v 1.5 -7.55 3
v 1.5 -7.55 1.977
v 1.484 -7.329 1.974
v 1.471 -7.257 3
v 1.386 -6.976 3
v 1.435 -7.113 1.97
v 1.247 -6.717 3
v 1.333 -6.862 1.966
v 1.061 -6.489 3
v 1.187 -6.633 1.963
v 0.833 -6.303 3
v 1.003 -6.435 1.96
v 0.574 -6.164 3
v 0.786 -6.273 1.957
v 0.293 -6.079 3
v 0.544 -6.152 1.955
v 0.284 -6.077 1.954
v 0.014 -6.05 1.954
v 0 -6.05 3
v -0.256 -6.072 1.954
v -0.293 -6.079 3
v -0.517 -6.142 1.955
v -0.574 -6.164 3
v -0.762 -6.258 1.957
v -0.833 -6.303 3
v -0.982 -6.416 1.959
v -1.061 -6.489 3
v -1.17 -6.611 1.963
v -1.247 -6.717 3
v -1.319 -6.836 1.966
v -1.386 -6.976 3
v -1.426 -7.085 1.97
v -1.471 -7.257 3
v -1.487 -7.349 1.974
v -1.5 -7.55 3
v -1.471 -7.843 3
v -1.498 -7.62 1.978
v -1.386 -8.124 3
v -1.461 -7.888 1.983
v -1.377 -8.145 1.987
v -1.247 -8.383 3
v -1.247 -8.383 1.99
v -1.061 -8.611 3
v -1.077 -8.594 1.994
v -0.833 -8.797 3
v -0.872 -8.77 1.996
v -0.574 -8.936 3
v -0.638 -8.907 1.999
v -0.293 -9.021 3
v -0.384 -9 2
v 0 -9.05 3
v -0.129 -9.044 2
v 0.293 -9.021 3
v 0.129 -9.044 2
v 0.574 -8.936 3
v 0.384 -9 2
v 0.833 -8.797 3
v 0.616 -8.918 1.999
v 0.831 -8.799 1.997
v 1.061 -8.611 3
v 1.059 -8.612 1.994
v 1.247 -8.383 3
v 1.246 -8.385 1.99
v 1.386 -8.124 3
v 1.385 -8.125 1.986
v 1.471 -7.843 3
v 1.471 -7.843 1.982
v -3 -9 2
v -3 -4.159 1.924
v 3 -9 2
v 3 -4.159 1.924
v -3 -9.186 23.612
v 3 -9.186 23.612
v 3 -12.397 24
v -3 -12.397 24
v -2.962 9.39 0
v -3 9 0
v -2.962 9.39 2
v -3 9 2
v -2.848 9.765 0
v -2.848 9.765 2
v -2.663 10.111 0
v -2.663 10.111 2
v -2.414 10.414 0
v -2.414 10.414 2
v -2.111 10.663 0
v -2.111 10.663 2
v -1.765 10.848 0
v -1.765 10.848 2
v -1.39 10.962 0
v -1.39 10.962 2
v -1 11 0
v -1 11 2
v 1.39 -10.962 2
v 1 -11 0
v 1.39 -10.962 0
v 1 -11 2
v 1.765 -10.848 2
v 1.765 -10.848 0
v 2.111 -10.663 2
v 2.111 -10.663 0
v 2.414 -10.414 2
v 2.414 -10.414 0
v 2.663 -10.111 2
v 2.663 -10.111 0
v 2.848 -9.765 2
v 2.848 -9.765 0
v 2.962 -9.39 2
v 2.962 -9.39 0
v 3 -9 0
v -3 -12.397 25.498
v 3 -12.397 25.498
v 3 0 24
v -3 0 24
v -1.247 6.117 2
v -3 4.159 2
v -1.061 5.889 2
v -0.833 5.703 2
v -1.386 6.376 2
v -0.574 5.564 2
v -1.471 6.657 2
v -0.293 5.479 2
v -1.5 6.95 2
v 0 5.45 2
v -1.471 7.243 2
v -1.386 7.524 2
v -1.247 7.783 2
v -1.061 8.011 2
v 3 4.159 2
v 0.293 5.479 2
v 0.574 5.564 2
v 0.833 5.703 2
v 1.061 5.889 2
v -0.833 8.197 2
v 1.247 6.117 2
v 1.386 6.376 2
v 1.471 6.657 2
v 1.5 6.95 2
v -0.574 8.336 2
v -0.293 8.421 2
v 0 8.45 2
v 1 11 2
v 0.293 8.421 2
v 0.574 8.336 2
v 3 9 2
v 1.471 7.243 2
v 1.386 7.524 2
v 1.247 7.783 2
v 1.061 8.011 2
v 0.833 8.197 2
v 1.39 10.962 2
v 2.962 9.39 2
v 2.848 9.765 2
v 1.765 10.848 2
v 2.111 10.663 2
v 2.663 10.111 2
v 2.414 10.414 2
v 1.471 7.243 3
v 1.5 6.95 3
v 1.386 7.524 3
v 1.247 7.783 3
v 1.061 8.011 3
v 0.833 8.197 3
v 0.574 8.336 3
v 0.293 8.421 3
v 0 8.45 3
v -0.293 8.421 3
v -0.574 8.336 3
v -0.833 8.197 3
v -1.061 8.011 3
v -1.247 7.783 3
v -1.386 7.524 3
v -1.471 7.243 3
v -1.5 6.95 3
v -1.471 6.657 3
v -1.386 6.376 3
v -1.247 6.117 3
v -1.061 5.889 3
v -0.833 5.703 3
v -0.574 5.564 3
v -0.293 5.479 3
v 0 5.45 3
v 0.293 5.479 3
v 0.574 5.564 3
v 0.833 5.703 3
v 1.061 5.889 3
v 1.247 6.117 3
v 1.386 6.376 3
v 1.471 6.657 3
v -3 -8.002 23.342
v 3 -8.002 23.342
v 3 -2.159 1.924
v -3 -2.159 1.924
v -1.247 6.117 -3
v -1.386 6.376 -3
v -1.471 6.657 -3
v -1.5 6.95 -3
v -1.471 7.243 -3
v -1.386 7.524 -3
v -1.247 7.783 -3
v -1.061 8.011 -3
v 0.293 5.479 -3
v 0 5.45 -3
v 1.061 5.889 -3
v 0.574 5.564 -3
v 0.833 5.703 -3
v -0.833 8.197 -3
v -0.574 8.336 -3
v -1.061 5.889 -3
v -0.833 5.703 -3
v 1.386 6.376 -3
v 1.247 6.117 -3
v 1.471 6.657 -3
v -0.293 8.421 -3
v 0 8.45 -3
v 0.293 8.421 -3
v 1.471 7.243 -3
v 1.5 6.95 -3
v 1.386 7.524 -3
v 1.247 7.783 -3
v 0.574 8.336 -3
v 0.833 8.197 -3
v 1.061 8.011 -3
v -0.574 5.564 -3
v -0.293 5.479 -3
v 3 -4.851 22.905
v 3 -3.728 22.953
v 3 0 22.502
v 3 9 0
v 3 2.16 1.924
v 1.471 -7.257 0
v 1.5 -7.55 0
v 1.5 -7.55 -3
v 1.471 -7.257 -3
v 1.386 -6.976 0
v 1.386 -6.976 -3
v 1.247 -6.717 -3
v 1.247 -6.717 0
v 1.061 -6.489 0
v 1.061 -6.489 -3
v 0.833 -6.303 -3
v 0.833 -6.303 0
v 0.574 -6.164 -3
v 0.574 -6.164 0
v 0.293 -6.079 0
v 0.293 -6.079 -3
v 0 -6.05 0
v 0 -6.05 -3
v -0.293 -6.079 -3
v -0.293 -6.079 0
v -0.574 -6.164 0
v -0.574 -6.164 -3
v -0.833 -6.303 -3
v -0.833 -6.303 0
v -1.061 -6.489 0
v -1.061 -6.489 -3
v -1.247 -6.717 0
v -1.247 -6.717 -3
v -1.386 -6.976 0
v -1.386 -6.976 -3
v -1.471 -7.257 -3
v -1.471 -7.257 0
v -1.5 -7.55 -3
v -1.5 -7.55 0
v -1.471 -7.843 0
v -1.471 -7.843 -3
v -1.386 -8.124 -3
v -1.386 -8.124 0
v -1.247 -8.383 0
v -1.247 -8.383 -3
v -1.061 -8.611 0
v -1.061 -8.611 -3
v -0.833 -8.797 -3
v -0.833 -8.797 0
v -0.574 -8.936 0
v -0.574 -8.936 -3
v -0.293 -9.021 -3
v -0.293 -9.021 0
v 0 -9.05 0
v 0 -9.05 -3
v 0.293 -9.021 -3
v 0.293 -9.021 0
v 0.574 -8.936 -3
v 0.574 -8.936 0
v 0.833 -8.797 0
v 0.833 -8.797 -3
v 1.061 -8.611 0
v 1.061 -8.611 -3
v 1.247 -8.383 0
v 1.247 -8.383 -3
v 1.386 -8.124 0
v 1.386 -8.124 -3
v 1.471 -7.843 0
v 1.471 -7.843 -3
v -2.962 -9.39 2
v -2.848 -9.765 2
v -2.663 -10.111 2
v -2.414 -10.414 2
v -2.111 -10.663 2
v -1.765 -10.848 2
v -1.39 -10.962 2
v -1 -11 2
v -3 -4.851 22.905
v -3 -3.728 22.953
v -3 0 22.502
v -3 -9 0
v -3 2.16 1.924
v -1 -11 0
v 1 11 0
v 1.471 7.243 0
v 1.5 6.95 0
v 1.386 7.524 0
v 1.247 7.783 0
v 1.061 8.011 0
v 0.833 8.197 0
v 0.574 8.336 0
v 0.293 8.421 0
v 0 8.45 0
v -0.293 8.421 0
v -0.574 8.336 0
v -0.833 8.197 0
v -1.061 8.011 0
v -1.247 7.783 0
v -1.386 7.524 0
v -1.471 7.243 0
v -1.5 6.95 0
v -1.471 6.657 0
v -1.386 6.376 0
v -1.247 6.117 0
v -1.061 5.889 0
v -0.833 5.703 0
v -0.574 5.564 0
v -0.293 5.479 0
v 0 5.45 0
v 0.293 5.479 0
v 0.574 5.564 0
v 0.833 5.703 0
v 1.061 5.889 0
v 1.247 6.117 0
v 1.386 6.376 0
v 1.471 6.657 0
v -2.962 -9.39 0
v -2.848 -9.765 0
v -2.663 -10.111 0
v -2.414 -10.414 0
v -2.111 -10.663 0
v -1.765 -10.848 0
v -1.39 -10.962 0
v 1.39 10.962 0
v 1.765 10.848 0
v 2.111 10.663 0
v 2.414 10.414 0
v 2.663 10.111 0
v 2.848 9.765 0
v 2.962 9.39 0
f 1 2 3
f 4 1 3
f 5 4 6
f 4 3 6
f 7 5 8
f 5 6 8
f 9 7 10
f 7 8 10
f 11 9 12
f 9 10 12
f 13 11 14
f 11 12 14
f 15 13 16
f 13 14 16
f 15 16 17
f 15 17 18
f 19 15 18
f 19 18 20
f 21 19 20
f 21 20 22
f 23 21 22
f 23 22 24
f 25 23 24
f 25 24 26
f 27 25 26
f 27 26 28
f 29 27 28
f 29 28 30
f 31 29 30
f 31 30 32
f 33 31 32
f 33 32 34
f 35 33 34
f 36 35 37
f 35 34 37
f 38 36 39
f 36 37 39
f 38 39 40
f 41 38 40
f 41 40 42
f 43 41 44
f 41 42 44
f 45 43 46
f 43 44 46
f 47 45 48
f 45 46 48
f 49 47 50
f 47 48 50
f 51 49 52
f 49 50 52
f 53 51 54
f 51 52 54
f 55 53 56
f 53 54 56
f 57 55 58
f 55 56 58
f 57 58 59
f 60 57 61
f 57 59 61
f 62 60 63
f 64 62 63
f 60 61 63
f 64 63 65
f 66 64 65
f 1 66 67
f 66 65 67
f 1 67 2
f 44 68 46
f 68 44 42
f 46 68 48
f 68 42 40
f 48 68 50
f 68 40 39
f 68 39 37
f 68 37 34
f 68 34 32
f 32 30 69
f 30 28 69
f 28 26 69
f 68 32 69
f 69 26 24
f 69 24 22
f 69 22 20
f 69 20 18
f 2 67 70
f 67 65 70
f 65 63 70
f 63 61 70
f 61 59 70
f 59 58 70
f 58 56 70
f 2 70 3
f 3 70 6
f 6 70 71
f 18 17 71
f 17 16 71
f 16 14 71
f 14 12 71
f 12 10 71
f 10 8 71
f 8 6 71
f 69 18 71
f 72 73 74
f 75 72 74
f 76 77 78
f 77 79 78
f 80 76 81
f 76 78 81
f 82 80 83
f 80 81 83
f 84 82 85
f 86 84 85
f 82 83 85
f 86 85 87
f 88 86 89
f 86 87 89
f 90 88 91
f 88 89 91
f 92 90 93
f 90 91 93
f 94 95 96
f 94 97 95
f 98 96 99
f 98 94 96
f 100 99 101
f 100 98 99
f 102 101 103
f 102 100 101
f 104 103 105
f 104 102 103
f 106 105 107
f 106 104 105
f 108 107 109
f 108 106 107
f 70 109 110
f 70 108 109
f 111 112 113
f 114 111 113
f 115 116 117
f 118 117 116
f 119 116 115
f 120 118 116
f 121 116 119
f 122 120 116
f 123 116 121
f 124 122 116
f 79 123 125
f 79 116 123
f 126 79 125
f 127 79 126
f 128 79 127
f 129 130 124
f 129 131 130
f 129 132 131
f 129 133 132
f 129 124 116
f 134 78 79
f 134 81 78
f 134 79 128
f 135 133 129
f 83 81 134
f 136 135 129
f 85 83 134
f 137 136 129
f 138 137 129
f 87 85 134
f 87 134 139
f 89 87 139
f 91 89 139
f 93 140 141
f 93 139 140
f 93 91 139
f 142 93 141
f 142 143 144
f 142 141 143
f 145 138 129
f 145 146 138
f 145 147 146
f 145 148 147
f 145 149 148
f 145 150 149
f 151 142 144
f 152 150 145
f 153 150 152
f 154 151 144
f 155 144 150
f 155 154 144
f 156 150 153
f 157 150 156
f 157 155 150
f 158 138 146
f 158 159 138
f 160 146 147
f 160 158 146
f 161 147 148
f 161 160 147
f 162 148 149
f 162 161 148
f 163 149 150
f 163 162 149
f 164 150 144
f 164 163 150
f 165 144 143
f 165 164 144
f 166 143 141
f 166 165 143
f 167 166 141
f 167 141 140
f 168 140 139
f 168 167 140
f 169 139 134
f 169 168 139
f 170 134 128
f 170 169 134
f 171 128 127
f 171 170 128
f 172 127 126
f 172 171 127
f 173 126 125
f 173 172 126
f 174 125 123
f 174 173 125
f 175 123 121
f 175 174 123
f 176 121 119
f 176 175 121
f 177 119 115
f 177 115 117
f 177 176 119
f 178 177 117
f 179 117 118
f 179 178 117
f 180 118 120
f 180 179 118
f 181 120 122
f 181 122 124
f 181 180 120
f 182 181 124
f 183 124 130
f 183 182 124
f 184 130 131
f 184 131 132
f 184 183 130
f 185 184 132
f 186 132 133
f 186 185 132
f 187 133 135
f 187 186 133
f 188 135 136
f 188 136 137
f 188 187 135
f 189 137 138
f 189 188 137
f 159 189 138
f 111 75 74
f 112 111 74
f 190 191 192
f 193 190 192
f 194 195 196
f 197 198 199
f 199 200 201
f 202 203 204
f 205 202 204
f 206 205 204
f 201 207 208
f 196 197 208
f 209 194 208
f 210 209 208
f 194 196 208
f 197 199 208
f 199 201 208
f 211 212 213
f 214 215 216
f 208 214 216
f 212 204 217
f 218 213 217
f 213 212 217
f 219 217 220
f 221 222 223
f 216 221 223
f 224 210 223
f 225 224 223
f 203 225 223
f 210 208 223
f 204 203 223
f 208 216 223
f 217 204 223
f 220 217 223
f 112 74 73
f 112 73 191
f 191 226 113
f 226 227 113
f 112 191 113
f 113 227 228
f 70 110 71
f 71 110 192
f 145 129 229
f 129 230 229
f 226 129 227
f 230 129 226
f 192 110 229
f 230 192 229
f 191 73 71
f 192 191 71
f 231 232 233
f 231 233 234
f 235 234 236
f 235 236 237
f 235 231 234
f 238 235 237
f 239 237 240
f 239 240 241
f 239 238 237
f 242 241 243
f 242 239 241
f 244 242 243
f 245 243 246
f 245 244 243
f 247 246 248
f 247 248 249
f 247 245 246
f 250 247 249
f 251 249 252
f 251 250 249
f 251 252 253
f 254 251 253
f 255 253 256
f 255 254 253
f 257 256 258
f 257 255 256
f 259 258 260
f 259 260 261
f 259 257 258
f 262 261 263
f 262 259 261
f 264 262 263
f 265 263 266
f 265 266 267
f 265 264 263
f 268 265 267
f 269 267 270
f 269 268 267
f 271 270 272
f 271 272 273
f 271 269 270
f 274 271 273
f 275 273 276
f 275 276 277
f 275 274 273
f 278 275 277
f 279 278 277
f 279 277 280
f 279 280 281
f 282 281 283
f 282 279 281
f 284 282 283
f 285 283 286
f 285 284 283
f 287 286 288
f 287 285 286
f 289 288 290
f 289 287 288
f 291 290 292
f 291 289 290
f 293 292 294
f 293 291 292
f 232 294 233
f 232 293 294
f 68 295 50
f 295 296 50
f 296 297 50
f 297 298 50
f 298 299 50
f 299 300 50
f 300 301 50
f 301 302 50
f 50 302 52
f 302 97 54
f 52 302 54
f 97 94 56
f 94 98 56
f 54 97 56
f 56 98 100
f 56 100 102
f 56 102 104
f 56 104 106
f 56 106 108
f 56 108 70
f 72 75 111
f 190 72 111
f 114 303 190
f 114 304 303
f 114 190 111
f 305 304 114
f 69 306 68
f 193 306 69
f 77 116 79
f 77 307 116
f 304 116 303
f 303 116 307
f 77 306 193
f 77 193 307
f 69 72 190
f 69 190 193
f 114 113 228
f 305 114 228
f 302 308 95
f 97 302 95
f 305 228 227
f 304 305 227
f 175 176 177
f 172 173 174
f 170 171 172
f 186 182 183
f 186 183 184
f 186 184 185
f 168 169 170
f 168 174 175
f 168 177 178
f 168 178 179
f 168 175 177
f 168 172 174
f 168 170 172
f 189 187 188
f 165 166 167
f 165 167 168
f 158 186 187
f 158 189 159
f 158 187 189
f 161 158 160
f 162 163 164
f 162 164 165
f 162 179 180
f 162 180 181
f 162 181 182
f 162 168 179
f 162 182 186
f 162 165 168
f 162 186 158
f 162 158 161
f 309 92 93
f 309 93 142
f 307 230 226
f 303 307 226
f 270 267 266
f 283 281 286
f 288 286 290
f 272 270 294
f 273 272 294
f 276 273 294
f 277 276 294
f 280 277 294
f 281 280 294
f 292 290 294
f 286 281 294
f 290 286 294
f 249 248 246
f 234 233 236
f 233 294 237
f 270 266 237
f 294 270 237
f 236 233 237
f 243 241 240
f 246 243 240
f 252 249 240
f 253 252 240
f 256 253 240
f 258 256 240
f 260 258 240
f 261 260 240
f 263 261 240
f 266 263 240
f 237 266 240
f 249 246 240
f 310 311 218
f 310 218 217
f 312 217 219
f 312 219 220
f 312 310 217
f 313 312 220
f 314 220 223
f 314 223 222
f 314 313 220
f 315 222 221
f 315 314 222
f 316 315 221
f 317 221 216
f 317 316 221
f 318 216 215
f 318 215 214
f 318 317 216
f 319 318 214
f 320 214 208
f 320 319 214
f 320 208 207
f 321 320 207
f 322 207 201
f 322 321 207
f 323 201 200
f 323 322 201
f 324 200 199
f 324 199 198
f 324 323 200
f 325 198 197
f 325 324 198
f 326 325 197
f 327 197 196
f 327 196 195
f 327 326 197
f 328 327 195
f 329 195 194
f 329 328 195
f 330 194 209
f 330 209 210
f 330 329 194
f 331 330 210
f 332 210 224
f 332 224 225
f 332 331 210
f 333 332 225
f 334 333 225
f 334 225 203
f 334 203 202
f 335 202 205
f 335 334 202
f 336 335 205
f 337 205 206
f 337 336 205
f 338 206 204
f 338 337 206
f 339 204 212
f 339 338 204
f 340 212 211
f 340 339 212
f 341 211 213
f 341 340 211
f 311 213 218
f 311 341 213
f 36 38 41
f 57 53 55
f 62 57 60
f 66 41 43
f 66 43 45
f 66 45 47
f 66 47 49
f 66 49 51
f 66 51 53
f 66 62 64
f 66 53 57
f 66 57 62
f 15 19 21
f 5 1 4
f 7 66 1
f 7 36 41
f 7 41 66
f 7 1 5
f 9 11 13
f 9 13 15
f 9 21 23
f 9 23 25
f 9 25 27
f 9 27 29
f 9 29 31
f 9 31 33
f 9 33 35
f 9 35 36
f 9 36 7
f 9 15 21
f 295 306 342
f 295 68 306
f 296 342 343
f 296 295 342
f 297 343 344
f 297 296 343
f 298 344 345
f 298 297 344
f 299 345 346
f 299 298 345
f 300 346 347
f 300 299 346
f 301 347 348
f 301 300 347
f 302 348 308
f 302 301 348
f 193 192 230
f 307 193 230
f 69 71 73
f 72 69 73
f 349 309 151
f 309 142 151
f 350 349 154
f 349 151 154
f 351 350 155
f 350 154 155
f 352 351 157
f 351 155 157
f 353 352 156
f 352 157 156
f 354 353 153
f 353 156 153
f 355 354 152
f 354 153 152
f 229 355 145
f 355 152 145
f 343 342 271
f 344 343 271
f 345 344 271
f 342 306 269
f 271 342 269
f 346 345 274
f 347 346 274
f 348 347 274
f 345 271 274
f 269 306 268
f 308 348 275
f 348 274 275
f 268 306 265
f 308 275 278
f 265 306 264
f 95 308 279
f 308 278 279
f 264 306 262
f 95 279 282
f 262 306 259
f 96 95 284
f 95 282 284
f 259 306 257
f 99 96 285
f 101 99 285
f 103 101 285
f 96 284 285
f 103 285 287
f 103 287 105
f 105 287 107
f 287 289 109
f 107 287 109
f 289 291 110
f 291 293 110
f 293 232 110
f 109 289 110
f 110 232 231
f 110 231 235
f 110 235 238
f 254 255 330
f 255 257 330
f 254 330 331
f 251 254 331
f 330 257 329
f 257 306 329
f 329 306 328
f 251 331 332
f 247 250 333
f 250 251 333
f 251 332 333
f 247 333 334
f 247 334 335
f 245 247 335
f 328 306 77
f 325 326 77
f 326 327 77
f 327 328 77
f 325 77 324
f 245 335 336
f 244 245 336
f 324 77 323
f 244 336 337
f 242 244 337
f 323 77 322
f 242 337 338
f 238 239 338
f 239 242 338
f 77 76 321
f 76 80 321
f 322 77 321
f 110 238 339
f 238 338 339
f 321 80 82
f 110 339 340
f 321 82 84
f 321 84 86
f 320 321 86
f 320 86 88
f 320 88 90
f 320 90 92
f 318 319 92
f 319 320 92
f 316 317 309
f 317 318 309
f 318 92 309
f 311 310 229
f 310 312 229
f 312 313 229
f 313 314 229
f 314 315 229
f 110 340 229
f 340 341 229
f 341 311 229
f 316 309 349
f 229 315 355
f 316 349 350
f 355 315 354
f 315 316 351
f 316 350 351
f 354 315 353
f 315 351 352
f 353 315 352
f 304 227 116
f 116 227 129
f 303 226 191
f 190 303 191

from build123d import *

# Parameters (mm, degrees)
F0_W     = 6
F0_H     = 22
F0_R     = 1.5
F1_DEPTH = 2
F2_R     = 2
F3_W     = 6
F3_H     = 16.5551486425
F4_DEPTH = 25
F6_DEPTH = 6
F8_DEPTH = 3
F9_DEPTH = 6


with BuildPart() as f1:
    # F0 (on Top) → F1 (new body)
    with BuildSketch(Plane.XY):
        Rectangle(F0_W, F0_H)
        with Locations((0, -7.55)):
            Circle(F0_R, mode=Mode.SUBTRACT)
        with Locations((0, 6.95)):
            Circle(F0_R, mode=Mode.SUBTRACT)
    extrude(amount=F1_DEPTH)

    # F2
    f2_edges = [f1.edges().sort_by_distance(p)[0] for p in [
        (-3, -11, 1),
        (3, -11, 1),
        (-3, 11, 1),
        (3, 11, 1),
    ]]
    fillet(f2_edges, radius=F2_R)

    # F3 (on face) → F4 (join)
    with BuildSketch(Plane.XY.offset(2)):
        with Locations((0, -4.1189596523)):
            Rectangle(F3_W, F3_H)
    extrude(amount=F4_DEPTH)

    # F5 (on face) → F6 (cut)
    with BuildSketch(Plane.YZ.offset(3)):
        Polygon((-4.159, 1.9240611), (-9.1855012482, 23.6120804718), (-12.3965339735, 24), (-12.3965339735, 2), (-9, 2), align=None)
        Polygon((0, 22.5023953283), (-3.7283909077, 22.9528160389), (4.158614669, 2), (4.158614669, 22), (4.158614669, 27), (-12.3965339735, 27), (-12.3965339735, 25.4976046717), (0, 24), align=None)
    extrude(amount=-F6_DEPTH, mode=Mode.SUBTRACT)

    # F0 (on Top) → F8 (join, symmetric)
    with BuildSketch(Plane.XY):
        with Locations((0, -7.55)):
            Circle(F0_R)
        with Locations((0, 6.95)):
            Circle(F0_R)
    extrude(amount=F8_DEPTH, both=True)

    # F7 (on face) → F9 (cut)
    with BuildSketch(Plane.YZ.offset(3)):
        Polygon((-8.002080251, 23.3416398971), (-2.159, 1.9240611), (2.1600568681, 1.9240611), (-4.8514023151, 22.9045075155), align=None)
    extrude(amount=-F9_DEPTH, mode=Mode.SUBTRACT)


solid = f1.part
